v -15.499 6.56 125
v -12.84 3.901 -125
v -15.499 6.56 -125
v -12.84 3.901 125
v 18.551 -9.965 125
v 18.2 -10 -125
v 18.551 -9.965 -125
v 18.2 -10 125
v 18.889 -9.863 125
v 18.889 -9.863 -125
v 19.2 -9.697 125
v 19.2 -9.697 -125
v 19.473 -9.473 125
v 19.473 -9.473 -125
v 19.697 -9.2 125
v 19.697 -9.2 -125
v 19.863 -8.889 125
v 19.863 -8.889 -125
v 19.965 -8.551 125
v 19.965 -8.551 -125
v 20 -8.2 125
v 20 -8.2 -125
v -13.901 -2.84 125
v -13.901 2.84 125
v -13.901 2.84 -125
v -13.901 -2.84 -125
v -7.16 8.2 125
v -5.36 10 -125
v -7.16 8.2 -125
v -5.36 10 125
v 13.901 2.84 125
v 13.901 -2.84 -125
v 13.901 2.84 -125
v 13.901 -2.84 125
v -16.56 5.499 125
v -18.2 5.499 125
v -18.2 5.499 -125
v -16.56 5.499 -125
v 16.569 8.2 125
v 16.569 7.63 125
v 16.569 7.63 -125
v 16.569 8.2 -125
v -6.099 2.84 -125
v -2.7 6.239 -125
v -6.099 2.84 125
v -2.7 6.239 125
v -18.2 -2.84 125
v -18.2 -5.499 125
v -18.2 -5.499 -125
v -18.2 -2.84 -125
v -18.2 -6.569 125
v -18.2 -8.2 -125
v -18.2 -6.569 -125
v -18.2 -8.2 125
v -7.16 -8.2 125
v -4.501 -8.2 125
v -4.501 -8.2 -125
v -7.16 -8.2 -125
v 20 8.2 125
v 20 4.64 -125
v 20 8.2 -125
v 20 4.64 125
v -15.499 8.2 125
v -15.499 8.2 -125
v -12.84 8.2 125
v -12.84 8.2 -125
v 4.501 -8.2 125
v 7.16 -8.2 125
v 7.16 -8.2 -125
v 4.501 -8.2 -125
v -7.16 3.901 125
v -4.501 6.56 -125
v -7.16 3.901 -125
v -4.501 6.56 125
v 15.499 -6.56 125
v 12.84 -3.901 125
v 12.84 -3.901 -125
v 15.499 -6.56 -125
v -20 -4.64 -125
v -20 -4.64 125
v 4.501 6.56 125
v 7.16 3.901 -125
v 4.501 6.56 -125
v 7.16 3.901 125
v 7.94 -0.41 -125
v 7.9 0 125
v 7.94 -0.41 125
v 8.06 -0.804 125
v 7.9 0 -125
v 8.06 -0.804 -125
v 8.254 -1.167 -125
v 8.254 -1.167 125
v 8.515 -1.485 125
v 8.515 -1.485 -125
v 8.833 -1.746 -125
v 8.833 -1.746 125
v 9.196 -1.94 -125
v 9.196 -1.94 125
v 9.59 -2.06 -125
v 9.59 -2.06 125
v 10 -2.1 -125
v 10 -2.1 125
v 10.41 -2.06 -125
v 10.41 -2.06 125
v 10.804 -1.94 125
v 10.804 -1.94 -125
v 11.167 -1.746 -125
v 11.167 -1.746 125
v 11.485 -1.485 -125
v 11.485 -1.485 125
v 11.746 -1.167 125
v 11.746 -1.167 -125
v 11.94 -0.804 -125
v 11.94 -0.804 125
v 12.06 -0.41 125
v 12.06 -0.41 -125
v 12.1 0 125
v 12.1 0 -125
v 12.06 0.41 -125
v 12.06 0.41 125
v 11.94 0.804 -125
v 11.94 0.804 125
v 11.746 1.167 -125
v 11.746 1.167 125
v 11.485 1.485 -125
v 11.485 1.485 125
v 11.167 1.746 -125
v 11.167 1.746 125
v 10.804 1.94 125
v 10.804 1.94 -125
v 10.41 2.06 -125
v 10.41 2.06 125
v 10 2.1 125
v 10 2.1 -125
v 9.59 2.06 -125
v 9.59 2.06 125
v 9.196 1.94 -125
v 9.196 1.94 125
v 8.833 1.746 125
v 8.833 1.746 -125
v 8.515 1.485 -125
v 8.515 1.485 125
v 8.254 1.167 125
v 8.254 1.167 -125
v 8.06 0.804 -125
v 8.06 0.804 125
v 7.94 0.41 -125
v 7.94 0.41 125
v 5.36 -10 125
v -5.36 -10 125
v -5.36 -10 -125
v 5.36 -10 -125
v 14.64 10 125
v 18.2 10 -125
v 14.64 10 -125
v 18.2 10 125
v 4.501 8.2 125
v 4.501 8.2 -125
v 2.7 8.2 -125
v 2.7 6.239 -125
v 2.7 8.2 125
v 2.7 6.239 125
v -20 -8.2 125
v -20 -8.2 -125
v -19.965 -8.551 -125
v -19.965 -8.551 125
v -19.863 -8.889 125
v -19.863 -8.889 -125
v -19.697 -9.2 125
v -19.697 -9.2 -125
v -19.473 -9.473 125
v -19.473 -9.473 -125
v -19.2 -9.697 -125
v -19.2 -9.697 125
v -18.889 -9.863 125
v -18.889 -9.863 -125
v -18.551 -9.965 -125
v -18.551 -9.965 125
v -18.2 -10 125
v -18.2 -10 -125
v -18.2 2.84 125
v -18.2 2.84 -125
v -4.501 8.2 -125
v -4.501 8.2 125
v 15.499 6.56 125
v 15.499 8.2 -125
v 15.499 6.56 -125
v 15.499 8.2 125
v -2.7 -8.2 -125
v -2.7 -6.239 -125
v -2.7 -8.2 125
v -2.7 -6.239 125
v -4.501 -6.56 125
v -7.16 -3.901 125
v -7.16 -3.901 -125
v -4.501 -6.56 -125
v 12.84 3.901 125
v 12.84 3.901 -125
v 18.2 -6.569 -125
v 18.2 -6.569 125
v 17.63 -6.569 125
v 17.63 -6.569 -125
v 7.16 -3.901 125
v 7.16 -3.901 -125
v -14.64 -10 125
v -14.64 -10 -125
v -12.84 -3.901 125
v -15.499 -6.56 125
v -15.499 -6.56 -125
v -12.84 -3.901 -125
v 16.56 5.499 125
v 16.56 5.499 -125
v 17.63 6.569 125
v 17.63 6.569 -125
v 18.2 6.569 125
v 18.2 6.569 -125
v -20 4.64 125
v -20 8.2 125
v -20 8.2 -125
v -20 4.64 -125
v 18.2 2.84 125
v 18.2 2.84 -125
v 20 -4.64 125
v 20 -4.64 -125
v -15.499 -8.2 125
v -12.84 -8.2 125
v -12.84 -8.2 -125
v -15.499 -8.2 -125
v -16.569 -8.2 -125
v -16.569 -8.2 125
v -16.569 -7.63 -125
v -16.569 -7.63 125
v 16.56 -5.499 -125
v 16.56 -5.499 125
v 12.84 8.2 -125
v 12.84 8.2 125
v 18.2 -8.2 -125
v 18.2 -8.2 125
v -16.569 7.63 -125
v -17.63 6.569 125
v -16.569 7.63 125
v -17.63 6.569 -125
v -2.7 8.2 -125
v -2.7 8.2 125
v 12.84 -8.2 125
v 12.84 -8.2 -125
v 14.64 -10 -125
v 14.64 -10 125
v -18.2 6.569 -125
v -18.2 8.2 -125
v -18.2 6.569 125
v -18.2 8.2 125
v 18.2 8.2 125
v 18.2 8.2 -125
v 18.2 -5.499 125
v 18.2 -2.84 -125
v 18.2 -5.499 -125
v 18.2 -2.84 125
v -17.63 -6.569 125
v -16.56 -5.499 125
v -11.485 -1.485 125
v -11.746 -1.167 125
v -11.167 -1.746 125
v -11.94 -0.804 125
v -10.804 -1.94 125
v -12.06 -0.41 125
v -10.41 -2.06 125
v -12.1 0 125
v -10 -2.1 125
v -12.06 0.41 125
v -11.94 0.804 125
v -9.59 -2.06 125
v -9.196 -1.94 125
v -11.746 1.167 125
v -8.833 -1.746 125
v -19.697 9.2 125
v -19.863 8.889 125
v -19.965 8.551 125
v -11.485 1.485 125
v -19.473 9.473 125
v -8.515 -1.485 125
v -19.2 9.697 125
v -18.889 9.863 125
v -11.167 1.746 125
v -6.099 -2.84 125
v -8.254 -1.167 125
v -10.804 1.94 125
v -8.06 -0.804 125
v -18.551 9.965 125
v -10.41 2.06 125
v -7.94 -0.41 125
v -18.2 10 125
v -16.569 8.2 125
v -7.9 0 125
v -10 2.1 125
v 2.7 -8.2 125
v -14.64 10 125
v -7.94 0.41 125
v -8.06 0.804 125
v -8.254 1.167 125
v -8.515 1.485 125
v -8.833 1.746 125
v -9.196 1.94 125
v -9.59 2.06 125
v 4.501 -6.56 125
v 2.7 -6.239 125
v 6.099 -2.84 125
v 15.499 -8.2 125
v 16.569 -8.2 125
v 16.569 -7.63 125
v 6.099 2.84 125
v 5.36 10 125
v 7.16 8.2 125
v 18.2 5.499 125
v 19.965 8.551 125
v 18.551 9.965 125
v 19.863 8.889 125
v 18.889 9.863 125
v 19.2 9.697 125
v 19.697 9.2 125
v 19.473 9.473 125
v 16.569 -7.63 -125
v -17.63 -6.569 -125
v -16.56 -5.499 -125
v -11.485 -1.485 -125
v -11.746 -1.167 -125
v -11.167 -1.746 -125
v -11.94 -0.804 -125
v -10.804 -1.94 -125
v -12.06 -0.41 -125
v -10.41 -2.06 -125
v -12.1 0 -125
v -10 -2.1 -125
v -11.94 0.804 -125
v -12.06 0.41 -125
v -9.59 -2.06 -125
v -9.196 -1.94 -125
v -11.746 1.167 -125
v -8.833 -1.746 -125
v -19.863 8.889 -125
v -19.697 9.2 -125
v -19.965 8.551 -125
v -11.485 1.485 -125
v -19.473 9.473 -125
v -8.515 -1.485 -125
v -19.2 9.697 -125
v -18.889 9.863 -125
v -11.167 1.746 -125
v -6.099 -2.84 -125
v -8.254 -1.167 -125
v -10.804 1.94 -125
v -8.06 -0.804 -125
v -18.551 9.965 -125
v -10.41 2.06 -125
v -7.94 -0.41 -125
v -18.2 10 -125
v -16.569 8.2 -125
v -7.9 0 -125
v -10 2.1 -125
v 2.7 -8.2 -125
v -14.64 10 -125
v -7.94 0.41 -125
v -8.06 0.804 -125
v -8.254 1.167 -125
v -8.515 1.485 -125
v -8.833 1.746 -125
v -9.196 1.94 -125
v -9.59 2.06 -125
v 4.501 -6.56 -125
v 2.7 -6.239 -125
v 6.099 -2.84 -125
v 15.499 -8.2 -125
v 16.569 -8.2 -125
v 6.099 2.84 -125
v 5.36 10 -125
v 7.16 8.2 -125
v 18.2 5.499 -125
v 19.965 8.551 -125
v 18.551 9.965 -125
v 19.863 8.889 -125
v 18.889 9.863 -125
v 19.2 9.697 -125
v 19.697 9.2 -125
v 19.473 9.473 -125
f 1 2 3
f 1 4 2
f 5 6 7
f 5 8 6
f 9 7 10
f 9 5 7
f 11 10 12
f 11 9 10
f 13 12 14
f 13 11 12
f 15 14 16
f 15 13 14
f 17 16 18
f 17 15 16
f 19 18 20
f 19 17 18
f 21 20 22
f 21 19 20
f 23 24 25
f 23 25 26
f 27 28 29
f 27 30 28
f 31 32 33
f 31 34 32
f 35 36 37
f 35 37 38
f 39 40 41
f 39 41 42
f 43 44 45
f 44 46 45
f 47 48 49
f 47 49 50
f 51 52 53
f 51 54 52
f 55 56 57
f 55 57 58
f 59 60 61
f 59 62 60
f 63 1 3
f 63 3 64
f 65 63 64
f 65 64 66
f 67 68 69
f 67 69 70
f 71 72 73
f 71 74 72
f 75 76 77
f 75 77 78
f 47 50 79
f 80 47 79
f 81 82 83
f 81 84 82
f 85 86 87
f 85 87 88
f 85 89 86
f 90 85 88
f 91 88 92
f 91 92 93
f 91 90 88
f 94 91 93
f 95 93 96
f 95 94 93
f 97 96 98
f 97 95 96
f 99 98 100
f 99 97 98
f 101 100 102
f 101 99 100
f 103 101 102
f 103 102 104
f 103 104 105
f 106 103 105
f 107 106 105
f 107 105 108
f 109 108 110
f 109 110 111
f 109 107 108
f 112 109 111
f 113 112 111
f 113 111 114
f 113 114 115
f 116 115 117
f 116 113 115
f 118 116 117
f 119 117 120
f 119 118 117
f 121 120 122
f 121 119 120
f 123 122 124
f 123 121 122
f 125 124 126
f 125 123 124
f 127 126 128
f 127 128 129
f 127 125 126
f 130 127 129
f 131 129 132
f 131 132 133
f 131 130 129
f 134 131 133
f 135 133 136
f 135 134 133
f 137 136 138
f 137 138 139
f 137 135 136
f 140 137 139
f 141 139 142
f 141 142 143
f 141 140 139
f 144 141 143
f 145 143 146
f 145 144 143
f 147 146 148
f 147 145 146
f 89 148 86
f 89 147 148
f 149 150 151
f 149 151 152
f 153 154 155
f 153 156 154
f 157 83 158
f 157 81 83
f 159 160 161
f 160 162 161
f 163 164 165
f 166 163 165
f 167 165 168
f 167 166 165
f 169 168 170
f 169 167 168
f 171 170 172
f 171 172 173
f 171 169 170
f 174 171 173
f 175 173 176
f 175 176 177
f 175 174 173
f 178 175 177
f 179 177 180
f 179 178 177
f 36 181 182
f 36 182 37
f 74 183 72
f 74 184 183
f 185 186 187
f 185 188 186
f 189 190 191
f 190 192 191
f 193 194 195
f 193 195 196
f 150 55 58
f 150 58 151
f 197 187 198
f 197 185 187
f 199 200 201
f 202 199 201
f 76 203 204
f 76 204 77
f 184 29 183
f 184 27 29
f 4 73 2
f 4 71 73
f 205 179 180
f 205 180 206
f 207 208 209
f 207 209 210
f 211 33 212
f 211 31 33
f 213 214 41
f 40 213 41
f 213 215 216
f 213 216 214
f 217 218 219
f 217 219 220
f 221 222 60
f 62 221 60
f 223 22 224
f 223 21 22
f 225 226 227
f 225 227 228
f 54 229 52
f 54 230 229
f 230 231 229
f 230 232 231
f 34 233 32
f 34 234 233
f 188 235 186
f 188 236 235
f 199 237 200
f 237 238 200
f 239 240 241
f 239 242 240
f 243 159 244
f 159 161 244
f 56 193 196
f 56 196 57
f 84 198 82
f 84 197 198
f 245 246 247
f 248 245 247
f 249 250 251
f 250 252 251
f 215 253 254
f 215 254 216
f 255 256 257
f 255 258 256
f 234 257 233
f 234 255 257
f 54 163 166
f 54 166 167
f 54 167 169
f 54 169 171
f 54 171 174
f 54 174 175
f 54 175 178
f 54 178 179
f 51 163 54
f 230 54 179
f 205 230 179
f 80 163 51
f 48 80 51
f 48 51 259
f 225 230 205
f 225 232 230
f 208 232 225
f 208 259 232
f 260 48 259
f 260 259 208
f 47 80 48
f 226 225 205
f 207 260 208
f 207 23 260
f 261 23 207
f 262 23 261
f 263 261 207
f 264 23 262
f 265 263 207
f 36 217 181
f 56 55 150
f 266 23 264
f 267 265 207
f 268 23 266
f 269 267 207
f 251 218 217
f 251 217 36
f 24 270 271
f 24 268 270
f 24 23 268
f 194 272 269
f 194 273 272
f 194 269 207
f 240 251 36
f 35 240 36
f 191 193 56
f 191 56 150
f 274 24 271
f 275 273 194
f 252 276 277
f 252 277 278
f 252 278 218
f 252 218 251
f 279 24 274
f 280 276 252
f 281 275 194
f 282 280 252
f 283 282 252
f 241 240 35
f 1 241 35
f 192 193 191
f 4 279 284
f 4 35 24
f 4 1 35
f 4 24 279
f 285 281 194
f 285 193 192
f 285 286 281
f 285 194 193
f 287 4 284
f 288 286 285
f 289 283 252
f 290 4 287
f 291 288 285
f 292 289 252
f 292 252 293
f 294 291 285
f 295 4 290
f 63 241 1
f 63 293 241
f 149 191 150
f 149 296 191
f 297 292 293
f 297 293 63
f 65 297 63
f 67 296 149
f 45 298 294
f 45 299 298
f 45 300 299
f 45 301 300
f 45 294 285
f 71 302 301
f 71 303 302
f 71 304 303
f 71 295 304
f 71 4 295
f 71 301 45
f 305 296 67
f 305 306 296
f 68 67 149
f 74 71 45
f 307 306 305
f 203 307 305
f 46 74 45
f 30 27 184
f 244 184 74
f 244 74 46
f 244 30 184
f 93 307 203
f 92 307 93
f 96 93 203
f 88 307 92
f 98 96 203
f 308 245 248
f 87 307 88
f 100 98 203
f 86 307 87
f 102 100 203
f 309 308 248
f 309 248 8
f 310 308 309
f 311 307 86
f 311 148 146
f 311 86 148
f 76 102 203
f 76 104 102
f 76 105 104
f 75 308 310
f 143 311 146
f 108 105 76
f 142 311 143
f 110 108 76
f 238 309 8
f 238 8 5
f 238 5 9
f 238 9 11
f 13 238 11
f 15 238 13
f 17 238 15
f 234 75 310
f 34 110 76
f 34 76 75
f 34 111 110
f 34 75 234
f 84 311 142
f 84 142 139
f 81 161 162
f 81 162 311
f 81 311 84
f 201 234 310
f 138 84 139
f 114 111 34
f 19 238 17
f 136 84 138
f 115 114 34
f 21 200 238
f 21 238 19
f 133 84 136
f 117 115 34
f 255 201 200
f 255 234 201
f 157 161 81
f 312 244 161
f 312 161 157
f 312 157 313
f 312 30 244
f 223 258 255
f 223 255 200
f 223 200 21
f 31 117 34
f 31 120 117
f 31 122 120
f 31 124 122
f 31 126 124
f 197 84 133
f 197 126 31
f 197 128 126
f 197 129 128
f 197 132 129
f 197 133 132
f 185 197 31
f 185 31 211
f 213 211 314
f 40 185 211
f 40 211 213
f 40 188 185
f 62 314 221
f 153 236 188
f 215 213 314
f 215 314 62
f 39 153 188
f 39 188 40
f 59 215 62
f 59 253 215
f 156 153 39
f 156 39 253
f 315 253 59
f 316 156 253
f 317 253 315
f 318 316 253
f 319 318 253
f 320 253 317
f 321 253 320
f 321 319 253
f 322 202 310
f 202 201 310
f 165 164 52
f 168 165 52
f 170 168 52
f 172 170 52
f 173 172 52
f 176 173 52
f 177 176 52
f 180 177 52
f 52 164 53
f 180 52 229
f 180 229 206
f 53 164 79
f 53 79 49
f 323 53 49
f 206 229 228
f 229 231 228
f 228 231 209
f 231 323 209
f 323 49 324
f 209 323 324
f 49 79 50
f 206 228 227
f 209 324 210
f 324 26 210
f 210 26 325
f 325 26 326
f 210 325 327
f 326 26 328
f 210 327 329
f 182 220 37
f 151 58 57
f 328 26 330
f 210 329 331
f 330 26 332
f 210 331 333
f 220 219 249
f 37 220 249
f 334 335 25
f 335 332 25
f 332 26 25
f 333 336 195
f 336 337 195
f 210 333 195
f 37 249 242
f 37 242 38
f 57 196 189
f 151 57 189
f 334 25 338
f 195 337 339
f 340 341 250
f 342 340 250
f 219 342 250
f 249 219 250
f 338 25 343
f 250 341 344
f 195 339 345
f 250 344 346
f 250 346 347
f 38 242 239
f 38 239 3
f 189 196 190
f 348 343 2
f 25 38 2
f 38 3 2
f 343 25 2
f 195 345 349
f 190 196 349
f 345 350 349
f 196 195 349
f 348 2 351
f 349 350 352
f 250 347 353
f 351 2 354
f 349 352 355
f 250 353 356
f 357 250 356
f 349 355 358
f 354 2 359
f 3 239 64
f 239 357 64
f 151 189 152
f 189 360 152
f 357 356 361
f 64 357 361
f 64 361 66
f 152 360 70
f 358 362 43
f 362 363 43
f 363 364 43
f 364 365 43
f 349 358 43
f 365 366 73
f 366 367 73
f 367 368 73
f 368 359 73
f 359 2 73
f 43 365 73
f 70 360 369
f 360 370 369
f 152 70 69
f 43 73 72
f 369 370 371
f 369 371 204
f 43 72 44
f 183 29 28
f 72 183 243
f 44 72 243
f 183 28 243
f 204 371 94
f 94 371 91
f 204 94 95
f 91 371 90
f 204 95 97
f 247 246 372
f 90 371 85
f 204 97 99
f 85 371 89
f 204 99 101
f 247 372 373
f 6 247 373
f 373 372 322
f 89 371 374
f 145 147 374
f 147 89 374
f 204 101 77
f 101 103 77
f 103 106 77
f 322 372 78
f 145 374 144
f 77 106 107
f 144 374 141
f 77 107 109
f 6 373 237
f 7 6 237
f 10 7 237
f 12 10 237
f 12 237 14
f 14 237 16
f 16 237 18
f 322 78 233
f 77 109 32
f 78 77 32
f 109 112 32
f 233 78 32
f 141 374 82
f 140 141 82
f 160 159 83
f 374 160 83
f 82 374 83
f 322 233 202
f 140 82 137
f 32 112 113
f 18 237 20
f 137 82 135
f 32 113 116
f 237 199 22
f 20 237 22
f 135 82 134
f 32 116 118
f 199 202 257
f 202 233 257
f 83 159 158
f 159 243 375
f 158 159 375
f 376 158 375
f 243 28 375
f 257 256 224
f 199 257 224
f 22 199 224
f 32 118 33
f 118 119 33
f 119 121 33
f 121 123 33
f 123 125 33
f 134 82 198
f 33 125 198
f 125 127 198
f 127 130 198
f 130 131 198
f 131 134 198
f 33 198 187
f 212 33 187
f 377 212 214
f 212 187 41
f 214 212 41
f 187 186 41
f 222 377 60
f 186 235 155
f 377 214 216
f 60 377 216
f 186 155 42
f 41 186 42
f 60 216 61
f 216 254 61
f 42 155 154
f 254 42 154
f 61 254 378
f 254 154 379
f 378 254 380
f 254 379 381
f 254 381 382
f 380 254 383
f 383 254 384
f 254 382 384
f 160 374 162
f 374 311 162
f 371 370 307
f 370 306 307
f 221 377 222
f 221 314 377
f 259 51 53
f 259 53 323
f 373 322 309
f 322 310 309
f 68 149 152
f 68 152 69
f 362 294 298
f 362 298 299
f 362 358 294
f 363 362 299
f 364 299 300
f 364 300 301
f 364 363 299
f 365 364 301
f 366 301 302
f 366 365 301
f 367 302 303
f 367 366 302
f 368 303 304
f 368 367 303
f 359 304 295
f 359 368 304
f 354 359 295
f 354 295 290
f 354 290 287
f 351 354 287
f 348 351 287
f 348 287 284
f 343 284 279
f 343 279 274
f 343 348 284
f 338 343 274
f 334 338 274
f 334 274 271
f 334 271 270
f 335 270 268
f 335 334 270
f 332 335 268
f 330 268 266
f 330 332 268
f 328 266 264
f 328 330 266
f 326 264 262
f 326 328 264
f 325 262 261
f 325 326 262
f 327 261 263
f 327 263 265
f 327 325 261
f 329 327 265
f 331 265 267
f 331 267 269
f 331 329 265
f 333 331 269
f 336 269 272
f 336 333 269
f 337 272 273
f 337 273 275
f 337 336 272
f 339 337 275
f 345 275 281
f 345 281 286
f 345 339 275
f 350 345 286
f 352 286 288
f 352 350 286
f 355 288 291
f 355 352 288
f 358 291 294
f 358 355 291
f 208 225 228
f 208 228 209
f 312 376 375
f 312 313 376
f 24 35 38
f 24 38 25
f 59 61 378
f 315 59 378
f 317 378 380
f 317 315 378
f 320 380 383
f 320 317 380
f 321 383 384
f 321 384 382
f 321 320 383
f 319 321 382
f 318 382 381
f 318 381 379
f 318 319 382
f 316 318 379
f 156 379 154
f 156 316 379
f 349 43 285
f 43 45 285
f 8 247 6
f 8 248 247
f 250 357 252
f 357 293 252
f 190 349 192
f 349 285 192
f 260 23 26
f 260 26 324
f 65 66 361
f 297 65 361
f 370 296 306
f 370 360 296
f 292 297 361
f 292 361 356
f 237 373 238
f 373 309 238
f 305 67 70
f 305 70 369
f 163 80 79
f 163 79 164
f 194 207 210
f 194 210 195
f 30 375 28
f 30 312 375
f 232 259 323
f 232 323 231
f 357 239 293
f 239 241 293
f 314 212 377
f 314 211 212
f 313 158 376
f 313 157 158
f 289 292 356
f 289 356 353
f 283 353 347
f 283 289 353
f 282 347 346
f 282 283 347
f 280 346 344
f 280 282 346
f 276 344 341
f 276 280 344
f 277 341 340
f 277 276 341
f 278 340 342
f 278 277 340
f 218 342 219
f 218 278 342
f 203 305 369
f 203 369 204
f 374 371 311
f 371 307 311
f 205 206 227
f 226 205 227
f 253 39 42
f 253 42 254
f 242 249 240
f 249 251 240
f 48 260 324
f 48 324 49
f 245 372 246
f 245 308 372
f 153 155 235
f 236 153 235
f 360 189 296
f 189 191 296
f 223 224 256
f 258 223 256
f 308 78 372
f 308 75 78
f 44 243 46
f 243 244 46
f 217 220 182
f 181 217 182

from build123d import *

# Parameters (mm, degrees)
ESQUISSE1_R        = 2.1
BOSS_EXTRU_1_DEPTH = 125


with BuildPart() as part:
    # Esquisse1 → Boss.-Extru.1 (new, symmetric)
    with BuildSketch(Plane.XY):
        with BuildLine():
            Line((-10, 3.900660172), (-12.84, 3.900660172))
            Line((-12.84, 3.900660172), (-15.499339828, 6.56))
            Line((-15.499339828, 6.56), (-15.499339828, 8.2))
            Line((-15.499339828, 8.2), (-12.84, 8.2))
            Line((-12.84, 8.2), (-14.64, 10))
            Line((-14.64, 10), (-18.2, 10))
            ThreePointArc((-18.2, 10), (-19.472792206, 9.472792206), (-20, 8.2))
            Line((-20, 8.2), (-20, 4.64))
            Line((-20, 4.64), (-18.2, 2.84))
            Line((-18.2, 2.84), (-18.2, 5.499339828))
            Line((-18.2, 5.499339828), (-16.56, 5.499339828))
            Line((-16.56, 5.499339828), (-13.900660172, 2.84))
            Line((-13.900660172, 2.84), (-13.900660172, 0))
            Line((-13.900660172, 0), (-13.900660172, -2.84))
            Line((-13.900660172, -2.84), (-16.56, -5.499339828))
            Line((-16.56, -5.499339828), (-18.2, -5.499339828))
            Line((-18.2, -5.499339828), (-18.2, -2.84))
            Line((-18.2, -2.84), (-20, -4.64))
            Line((-20, -4.64), (-20, -8.2))
            ThreePointArc((-20, -8.2), (-19.472792206, -9.472792206), (-18.2, -10))
            Line((-18.2, -10), (-14.64, -10))
            Line((-14.64, -10), (-12.84, -8.2))
            Line((-12.84, -8.2), (-15.499339828, -8.2))
            Line((-15.499339828, -8.2), (-15.499339828, -6.56))
            Line((-15.499339828, -6.56), (-12.84, -3.900660172))
            Line((-12.84, -3.900660172), (-10, -3.900660172))
            Line((-10, -3.900660172), (-7.16, -3.900660172))
            Line((-7.16, -3.900660172), (-4.500660172, -6.56))
            Line((-4.500660172, -6.56), (-4.500660172, -8.2))
            Line((-4.500660172, -8.2), (-7.16, -8.2))
            Line((-7.16, -8.2), (-5.36, -10))
            Line((-5.36, -10), (5.36, -10))
            Line((5.36, -10), (7.16, -8.2))
            Line((7.16, -8.2), (4.500660172, -8.2))
            Line((4.500660172, -8.2), (4.500660172, -6.56))
            Line((4.500660172, -6.56), (7.16, -3.900660172))
            Line((7.16, -3.900660172), (10, -3.900660172))
            Line((10, -3.900660172), (12.84, -3.900660172))
            Line((12.84, -3.900660172), (15.499339828, -6.56))
            Line((15.499339828, -6.56), (15.499339828, -8.2))
            Line((15.499339828, -8.2), (12.84, -8.2))
            Line((12.84, -8.2), (14.64, -10))
            Line((14.64, -10), (18.2, -10))
            ThreePointArc((18.2, -10), (19.472792206, -9.472792206), (20, -8.2))
            Line((20, -8.2), (20, -4.64))
            Line((20, -4.64), (18.2, -2.84))
            Line((18.2, -2.84), (18.2, -5.499339828))
            Line((18.2, -5.499339828), (16.56, -5.499339828))
            Line((16.56, -5.499339828), (13.900660172, -2.84))
            Line((13.900660172, -2.84), (13.900660172, 0))
            Line((13.900660172, 0), (13.900660172, 2.84))
            Line((13.900660172, 2.84), (16.56, 5.499339828))
            Line((16.56, 5.499339828), (18.2, 5.499339828))
            Line((18.2, 5.499339828), (18.2, 2.84))
            Line((18.2, 2.84), (20, 4.64))
            Line((20, 4.64), (20, 8.2))
            ThreePointArc((20, 8.2), (19.472792206, 9.472792206), (18.2, 10))
            Line((18.2, 10), (14.64, 10))
            Line((14.64, 10), (12.84, 8.2))
            Line((12.84, 8.2), (15.499339828, 8.2))
            Line((15.499339828, 8.2), (15.499339828, 6.56))
            Line((15.499339828, 6.56), (12.84, 3.900660172))
            Line((12.84, 3.900660172), (10, 3.900660172))
            Line((10, 3.900660172), (7.16, 3.900660172))
            Line((7.16, 3.900660172), (4.500660172, 6.56))
            Line((4.500660172, 6.56), (4.500660172, 8.2))
            Line((4.500660172, 8.2), (7.16, 8.2))
            Line((7.16, 8.2), (5.36, 10))
            Line((5.36, 10), (-5.36, 10))
            Line((-5.36, 10), (-7.16, 8.2))
            Line((-7.16, 8.2), (-4.500660172, 8.2))
            Line((-4.500660172, 8.2), (-4.500660172, 6.56))
            Line((-4.500660172, 6.56), (-7.16, 3.900660172))
            Line((-7.16, 3.900660172), (-10, 3.900660172))
        make_face()
        with Locations((-10, 0)):
            Circle(ESQUISSE1_R, mode=Mode.SUBTRACT)
        with Locations(Location((10, 0, 0), (0, 0, 180))):
            Circle(ESQUISSE1_R, mode=Mode.SUBTRACT)
        Polygon((-2.7, 8.2), (-2.7, 6.239339828), (-6.099339828, 2.84), (-6.099339828, -2.84), (-2.7, -6.239339828), (-2.7, -8.2), (2.7, -8.2), (2.7, -6.239339828), (6.099339828, -2.84), (6.099339828, 2.84), (2.7, 6.239339828), (2.7, 8.2), align=None, mode=Mode.SUBTRACT)
        Polygon((-18.2, 8.2), (-18.2, 6.569339828), (-17.63, 6.569339828), (-16.569339828, 7.63), (-16.569339828, 8.2), align=None, mode=Mode.SUBTRACT)
        Polygon((-18.2, -6.569339828), (-17.63, -6.569339828), (-16.569339828, -7.63), (-16.569339828, -8.2), (-18.2, -8.2), align=None, mode=Mode.SUBTRACT)
        Polygon((18.2, 6.569339828), (17.63, 6.569339828), (16.569339828, 7.63), (16.569339828, 8.2), (18.2, 8.2), align=None, mode=Mode.SUBTRACT)
        Polygon((18.2, -6.569339828), (17.63, -6.569339828), (16.569339828, -7.63), (16.569339828, -8.2), (18.2, -8.2), align=None, mode=Mode.SUBTRACT)
    extrude(amount=BOSS_EXTRU_1_DEPTH, both=True)


solid = part.part
